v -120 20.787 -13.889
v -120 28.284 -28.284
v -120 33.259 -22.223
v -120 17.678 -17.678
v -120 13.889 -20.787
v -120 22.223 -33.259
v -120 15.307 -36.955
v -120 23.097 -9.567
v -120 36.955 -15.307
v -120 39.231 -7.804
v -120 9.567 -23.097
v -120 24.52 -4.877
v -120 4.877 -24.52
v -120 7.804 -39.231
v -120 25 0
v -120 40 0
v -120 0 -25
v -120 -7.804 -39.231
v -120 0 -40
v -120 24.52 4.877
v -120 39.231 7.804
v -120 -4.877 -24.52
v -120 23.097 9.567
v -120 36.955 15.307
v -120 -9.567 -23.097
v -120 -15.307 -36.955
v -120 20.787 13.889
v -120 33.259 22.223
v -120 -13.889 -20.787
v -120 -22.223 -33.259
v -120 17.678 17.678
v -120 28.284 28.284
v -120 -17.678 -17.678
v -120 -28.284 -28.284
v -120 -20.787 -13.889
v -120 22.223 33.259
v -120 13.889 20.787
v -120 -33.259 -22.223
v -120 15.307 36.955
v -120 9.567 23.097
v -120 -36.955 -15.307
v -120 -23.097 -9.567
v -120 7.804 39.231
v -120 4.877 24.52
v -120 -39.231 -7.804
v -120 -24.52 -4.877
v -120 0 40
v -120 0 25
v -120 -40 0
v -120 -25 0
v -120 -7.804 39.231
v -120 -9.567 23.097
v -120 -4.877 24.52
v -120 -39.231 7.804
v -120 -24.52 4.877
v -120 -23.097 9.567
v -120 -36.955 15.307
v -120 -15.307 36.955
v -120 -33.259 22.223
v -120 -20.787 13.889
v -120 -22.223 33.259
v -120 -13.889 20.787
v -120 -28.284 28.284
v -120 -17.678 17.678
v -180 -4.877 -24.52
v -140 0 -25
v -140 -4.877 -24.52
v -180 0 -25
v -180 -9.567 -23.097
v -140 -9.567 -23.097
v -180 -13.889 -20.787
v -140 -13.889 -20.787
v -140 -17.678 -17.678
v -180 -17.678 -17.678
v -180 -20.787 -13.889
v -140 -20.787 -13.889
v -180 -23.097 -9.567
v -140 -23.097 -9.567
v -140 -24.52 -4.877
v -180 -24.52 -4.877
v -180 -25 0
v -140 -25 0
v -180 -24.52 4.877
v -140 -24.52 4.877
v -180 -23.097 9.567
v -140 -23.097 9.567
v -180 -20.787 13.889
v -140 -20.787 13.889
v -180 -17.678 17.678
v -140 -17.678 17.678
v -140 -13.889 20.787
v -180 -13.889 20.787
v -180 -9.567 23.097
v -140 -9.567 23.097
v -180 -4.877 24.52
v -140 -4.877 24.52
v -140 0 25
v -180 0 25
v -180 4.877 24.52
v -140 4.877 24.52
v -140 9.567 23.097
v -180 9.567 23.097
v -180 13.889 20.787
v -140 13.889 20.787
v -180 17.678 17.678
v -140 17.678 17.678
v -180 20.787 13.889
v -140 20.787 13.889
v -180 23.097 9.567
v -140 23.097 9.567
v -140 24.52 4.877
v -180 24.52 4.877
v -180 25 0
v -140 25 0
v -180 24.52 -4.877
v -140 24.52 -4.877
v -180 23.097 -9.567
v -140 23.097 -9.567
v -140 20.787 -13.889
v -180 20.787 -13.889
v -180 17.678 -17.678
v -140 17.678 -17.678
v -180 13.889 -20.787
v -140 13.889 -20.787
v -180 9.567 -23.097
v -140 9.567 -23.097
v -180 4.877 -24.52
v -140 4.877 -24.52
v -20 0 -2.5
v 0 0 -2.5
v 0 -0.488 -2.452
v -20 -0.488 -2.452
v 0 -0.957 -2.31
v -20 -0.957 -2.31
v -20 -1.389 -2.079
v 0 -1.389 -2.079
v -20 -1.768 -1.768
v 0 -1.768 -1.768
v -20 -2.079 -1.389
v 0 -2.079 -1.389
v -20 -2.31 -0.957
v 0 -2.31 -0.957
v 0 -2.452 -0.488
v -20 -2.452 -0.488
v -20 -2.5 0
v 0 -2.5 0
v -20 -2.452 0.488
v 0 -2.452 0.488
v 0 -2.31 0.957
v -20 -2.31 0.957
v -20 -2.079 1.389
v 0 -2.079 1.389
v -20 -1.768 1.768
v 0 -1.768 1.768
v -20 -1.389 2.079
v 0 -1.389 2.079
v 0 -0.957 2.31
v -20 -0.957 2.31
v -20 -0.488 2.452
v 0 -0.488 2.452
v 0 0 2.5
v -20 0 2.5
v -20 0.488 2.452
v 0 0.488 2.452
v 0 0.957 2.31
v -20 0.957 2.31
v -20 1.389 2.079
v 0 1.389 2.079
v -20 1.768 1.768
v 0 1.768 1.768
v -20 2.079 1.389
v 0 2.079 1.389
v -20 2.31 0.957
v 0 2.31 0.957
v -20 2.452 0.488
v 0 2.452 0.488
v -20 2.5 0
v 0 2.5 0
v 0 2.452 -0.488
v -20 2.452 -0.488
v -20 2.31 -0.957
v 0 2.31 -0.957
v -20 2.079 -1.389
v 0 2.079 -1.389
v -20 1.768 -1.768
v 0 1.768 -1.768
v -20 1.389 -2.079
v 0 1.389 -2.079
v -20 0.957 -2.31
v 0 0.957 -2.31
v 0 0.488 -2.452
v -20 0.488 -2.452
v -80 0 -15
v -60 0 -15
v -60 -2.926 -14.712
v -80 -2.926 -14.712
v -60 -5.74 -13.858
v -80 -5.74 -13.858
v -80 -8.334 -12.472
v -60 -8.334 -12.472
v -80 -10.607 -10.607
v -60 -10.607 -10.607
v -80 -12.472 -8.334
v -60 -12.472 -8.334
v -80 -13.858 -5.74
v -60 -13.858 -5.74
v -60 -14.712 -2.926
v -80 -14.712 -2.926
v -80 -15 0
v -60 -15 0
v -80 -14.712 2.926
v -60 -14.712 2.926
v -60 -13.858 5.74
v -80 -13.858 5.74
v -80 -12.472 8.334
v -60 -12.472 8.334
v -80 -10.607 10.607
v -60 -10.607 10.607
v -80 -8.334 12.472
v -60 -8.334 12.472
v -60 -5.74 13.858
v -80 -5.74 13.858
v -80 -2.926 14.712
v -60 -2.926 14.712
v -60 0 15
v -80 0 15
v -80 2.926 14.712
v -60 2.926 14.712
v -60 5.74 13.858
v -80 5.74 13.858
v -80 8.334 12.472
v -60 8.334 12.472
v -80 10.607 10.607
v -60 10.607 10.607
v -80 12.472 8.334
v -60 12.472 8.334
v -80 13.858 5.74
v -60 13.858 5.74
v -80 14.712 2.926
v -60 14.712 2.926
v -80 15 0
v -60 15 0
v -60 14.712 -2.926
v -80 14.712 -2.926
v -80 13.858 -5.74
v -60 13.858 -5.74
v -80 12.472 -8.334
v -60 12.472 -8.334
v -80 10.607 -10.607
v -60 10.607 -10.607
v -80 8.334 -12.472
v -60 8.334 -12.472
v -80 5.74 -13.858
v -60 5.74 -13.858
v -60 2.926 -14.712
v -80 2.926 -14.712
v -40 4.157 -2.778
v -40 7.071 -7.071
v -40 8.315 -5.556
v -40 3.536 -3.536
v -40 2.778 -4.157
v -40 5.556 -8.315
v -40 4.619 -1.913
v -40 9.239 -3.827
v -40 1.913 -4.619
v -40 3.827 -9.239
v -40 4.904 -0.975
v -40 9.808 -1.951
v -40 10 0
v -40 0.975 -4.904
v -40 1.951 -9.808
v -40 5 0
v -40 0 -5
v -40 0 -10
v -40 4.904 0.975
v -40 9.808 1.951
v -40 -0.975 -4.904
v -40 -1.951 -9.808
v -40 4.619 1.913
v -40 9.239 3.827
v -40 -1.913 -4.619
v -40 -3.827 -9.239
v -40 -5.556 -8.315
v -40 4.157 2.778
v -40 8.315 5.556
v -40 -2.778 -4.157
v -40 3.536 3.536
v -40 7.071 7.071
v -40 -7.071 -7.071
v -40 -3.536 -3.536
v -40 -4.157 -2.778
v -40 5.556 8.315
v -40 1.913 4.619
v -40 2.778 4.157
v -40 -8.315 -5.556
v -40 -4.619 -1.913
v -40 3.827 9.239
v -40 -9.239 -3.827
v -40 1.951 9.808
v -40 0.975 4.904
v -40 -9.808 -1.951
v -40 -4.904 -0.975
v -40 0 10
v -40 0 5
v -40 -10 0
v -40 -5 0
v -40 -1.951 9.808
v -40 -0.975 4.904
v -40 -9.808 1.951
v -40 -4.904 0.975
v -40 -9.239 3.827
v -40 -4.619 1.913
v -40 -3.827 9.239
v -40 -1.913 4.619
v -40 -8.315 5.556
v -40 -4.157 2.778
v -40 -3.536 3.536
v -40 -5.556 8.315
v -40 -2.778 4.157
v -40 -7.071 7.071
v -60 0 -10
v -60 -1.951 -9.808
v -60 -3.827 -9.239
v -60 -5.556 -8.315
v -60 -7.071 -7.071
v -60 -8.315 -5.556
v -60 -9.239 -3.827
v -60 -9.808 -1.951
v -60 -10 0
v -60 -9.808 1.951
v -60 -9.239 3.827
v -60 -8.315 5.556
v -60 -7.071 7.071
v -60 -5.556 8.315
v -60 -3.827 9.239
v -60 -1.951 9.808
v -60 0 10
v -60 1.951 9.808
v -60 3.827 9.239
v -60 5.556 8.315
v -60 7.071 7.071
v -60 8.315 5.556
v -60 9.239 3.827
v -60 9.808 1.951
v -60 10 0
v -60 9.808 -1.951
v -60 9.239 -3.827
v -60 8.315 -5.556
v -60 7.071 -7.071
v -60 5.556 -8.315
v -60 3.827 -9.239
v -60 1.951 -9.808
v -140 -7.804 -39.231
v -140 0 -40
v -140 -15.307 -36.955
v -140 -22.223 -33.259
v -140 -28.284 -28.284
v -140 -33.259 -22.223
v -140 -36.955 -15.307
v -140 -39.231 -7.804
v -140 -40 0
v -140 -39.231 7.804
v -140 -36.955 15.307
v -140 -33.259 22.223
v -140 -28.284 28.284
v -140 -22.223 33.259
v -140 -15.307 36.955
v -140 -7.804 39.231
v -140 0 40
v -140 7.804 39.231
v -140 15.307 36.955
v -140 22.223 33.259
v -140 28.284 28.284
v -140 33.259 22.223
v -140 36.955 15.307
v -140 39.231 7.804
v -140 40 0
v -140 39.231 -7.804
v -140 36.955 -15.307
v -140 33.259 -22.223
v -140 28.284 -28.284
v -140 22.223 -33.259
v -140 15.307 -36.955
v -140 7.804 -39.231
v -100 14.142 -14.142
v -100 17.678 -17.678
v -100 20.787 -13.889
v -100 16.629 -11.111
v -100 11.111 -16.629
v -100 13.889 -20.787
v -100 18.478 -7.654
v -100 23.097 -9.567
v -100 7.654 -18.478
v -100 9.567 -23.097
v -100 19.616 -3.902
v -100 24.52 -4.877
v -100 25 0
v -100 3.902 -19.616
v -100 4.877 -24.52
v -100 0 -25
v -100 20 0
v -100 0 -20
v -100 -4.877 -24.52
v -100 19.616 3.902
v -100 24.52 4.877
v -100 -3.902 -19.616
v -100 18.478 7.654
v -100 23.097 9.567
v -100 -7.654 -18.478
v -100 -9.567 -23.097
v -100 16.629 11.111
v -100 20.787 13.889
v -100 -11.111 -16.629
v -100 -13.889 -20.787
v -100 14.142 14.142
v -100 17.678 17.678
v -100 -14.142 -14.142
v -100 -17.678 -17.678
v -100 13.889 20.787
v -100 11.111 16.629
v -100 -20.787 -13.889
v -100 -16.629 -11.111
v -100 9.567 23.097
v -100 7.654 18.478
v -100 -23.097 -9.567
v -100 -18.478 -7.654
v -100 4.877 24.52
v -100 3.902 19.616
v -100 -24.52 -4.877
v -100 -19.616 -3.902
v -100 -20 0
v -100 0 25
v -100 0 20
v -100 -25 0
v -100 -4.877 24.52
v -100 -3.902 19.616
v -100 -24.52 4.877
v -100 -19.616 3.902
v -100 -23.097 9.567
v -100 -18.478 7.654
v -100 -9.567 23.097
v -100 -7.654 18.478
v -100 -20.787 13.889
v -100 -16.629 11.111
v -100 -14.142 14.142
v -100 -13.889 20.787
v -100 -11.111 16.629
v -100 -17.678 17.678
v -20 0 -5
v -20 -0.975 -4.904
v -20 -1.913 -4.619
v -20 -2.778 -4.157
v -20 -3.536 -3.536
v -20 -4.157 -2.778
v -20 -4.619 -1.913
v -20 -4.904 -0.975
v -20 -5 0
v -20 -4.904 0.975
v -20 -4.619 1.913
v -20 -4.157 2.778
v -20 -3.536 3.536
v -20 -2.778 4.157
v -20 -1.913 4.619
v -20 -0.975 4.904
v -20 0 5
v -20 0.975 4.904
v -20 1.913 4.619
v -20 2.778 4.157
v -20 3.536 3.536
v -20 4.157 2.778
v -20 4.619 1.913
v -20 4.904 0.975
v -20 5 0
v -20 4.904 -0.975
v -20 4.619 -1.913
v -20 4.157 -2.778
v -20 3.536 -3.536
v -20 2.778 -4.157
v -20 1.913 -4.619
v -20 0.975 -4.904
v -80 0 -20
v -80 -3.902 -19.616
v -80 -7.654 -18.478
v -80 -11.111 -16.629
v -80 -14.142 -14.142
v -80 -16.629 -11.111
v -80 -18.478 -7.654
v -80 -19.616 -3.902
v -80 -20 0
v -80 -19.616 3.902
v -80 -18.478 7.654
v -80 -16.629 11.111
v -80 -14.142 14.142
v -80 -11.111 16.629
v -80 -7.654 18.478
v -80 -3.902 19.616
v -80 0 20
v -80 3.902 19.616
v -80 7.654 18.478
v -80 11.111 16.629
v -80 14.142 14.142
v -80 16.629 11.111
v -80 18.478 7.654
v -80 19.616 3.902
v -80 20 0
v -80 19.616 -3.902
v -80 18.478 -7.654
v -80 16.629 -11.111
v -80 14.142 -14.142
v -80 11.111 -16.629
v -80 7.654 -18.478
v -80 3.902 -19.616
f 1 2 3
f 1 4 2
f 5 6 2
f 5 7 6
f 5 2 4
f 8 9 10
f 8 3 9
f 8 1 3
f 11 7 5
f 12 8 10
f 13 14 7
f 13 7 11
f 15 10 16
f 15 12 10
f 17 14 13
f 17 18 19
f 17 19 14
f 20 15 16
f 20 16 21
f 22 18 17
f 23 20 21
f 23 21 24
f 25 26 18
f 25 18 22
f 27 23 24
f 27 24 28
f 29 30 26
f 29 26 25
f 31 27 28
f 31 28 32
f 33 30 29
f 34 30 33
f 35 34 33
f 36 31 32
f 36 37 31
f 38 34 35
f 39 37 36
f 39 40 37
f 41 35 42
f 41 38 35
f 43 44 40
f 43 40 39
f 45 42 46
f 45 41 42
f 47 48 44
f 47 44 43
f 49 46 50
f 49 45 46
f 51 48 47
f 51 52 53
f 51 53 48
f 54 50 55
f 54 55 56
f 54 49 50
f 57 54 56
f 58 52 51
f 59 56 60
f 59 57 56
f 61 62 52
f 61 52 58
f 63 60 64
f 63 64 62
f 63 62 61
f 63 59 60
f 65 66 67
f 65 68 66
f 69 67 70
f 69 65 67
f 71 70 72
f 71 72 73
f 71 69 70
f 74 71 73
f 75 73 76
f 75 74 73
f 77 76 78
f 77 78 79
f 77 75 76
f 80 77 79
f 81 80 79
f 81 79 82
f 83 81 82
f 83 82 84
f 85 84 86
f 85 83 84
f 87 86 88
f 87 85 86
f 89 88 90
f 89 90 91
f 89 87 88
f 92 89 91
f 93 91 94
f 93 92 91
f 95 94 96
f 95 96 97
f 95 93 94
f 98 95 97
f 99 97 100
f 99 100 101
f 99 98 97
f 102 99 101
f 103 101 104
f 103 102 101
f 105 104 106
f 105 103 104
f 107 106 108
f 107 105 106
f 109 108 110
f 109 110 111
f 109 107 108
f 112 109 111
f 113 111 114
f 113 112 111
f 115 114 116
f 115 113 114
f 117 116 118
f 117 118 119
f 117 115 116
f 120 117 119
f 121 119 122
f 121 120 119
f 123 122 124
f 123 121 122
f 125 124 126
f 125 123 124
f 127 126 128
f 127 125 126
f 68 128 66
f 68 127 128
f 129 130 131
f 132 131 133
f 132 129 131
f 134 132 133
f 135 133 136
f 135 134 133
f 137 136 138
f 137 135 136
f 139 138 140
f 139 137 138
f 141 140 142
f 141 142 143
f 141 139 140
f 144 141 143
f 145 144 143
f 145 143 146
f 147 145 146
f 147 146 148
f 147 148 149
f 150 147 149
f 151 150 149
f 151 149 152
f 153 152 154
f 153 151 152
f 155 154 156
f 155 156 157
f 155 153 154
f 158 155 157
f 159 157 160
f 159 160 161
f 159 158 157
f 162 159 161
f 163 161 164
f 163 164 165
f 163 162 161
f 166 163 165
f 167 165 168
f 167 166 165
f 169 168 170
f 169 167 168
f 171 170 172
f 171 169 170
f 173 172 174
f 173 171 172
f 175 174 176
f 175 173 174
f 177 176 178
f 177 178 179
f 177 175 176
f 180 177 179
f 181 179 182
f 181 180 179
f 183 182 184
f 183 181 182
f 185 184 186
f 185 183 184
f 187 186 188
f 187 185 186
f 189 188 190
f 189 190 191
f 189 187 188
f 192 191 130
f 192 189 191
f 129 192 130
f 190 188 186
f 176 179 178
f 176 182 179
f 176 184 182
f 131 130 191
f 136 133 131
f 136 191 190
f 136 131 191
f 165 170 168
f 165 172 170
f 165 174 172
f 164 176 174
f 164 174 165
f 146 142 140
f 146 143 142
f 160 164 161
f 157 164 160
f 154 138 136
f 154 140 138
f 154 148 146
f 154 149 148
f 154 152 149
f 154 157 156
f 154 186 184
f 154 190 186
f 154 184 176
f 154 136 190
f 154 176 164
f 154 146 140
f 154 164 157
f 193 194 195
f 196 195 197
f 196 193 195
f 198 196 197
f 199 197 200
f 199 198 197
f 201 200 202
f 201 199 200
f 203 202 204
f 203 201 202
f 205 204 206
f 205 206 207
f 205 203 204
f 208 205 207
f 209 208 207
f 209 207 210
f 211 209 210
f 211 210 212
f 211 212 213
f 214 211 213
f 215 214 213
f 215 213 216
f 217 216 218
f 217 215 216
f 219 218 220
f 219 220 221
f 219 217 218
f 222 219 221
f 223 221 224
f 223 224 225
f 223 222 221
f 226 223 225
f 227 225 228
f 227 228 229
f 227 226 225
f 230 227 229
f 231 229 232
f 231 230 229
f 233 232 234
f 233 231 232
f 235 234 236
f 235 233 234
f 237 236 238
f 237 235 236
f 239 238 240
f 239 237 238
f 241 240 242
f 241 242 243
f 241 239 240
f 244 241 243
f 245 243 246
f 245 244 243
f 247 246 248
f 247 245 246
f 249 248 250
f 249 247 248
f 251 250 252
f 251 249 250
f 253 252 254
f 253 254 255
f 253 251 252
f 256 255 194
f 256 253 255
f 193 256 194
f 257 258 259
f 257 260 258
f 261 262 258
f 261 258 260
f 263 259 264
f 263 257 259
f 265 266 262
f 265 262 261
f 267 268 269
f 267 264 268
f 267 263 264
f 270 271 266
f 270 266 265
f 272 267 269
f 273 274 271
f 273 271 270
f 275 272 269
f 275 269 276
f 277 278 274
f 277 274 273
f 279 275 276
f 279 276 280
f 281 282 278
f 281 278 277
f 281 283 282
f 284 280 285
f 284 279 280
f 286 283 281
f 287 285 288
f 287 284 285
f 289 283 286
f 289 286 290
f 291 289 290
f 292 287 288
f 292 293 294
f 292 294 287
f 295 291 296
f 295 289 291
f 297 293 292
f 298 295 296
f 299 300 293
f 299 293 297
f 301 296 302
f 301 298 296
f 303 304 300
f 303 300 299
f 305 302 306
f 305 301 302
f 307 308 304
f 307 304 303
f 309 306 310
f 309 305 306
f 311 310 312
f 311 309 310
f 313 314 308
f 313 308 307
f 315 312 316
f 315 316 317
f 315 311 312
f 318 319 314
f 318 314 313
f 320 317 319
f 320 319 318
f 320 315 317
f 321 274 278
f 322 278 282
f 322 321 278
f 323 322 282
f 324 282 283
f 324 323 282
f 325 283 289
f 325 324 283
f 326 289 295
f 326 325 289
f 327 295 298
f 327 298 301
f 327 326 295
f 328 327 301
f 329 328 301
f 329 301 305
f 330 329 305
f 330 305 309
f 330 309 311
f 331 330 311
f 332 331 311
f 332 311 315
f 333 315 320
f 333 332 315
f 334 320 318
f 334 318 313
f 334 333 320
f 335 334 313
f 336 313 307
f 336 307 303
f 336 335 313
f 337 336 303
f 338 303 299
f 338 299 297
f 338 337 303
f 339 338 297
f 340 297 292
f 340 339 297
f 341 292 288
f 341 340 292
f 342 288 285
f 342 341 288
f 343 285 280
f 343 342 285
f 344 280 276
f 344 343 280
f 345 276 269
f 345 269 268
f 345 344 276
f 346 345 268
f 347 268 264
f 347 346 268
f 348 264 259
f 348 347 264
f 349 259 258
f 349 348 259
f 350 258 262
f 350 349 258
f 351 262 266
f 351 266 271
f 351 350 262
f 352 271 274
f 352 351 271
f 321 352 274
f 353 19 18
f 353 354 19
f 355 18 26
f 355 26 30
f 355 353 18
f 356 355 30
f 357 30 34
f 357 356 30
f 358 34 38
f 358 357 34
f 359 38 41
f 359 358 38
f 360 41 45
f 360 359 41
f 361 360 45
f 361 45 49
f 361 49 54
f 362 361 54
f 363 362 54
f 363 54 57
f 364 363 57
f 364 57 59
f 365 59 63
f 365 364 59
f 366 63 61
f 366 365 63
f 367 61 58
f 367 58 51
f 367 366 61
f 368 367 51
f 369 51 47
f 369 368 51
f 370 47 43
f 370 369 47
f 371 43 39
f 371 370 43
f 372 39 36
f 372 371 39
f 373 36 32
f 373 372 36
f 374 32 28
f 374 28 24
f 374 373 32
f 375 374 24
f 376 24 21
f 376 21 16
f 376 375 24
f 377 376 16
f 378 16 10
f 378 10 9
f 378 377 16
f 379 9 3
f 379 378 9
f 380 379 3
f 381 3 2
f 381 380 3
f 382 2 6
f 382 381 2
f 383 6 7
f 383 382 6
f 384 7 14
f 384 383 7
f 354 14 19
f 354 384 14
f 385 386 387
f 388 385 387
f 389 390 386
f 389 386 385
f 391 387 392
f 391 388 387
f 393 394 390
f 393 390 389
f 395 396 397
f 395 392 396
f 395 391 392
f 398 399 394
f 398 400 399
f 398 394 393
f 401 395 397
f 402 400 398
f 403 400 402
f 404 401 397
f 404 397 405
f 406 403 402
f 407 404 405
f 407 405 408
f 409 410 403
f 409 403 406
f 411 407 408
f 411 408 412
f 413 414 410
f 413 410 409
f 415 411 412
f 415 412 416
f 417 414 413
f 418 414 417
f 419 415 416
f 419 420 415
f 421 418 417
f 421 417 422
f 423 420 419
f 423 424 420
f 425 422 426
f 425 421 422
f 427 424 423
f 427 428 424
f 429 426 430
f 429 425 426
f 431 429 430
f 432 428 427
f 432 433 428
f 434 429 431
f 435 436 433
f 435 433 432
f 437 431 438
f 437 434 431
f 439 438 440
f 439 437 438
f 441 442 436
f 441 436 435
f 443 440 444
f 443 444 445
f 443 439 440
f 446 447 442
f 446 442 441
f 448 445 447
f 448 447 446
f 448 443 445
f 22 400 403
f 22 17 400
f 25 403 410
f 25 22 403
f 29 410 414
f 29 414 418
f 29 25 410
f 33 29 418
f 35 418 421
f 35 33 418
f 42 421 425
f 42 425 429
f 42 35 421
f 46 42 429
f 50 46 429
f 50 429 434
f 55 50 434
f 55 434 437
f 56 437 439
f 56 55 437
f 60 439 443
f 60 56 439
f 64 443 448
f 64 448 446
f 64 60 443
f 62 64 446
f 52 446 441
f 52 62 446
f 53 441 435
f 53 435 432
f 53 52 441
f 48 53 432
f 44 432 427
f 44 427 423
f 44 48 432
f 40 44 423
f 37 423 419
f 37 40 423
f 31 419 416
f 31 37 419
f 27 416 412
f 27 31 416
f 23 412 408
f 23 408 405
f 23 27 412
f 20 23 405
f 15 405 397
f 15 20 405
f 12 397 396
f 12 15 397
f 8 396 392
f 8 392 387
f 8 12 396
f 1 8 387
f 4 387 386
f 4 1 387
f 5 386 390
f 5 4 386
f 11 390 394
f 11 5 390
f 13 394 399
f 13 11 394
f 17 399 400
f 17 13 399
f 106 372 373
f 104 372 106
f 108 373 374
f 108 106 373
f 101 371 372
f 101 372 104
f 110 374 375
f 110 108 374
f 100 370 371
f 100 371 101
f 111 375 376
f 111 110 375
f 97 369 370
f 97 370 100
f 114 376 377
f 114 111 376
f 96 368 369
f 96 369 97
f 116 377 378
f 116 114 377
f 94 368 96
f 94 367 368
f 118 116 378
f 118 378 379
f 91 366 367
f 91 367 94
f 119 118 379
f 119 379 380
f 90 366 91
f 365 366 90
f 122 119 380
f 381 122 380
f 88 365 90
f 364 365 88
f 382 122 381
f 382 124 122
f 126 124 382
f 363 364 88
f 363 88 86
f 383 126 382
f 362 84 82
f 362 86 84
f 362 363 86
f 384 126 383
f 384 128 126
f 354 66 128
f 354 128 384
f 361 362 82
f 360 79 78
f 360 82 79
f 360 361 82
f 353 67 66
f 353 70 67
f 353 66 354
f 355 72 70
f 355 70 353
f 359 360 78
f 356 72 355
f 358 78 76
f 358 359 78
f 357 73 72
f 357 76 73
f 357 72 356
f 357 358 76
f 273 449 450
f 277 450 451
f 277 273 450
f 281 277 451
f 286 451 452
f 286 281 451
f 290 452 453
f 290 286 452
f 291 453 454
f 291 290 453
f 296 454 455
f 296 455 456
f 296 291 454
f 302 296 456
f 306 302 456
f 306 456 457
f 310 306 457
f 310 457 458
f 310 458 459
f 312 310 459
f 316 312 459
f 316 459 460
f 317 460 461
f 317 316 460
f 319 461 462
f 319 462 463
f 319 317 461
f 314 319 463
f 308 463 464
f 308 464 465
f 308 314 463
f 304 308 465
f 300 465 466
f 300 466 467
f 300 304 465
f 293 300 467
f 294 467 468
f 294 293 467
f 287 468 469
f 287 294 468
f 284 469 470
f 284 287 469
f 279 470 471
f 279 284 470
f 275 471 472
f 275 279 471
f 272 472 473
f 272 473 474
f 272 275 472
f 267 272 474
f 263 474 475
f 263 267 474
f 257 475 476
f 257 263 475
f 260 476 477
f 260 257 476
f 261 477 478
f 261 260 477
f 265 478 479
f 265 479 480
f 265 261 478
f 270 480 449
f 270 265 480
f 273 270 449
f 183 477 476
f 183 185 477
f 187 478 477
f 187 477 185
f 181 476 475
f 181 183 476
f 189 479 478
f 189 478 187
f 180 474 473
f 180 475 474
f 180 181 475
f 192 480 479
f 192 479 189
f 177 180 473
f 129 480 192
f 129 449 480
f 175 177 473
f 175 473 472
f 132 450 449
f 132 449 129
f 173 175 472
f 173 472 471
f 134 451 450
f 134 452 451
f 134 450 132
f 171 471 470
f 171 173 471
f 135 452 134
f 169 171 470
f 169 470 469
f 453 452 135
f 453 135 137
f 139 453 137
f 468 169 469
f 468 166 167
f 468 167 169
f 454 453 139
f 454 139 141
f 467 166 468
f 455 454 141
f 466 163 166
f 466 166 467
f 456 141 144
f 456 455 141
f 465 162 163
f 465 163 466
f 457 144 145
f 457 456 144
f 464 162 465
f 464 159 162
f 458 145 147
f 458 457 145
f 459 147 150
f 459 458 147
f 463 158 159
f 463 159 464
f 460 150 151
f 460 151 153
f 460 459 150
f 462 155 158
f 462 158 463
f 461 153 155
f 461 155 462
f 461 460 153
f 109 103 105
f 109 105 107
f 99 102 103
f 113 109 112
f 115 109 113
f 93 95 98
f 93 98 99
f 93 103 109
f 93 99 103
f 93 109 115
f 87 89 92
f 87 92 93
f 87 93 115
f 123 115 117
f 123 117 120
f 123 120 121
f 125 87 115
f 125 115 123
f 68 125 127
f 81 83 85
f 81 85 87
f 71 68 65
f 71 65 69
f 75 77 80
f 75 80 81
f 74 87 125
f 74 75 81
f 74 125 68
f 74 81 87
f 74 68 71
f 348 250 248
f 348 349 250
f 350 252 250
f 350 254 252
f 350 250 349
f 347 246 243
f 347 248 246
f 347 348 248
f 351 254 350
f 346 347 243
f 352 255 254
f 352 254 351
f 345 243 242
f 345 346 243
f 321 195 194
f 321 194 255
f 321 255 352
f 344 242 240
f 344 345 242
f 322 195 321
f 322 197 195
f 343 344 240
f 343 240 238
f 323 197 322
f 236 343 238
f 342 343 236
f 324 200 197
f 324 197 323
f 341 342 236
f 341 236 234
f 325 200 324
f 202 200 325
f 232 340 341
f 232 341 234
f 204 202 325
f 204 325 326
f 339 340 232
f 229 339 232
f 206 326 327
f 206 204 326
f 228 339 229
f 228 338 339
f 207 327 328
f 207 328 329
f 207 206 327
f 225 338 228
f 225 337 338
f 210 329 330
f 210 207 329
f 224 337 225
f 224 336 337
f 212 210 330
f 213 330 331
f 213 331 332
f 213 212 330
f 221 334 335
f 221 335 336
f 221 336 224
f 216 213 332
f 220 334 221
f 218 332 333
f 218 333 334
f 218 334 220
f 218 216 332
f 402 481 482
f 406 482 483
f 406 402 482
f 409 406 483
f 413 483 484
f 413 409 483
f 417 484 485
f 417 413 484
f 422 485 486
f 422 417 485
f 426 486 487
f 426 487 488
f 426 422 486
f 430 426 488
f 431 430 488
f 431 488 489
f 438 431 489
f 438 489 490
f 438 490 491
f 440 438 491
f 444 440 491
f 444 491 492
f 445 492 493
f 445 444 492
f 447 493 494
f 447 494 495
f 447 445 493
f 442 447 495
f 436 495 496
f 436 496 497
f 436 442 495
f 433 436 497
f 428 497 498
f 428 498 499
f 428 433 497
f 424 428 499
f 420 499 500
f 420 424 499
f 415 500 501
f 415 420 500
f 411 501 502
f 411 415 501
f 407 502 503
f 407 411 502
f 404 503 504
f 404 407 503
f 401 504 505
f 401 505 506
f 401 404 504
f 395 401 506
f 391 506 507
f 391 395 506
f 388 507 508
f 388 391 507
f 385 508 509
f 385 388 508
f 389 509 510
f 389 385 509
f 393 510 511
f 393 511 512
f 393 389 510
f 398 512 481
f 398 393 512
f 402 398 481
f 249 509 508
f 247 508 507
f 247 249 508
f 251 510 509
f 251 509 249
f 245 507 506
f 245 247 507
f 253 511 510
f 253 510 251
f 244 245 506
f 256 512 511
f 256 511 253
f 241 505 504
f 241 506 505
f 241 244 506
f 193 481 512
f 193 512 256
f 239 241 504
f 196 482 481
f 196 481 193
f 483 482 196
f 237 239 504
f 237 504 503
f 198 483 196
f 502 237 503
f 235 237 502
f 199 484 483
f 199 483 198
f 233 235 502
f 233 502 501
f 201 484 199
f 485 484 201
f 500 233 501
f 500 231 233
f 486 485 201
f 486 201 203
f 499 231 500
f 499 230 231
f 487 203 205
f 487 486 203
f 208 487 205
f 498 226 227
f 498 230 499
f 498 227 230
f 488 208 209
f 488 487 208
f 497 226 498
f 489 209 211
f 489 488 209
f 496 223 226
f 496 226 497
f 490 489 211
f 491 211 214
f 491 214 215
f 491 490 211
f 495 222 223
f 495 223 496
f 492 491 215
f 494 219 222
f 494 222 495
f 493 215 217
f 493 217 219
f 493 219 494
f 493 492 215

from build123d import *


with BuildPart() as part:
    # Sketch1 → Revolve4 (revolve)
    with BuildSketch(Plane.XY, mode=Mode.PRIVATE) as revolve4_sk:
        Polygon((-180, 0), (0, 0), (0, 2.5), (-20, 2.5), (-20, 5), (-40, 5), (-40, 10), (-60, 10), (-60, 15), (-80, 15), (-80, 20), (-100, 20), (-100, 25), (-120, 25), (-120, 40), (-140, 40), (-140, 25), (-180, 25), align=None)
    revolve(revolve4_sk.sketch.rotate(Axis((0, 0, 0), (-1, 0, 0)), 90), axis=Axis((0, 0, 0), (-1, 0, 0)))  # turned: the seam where the file's is


solid = part.part
